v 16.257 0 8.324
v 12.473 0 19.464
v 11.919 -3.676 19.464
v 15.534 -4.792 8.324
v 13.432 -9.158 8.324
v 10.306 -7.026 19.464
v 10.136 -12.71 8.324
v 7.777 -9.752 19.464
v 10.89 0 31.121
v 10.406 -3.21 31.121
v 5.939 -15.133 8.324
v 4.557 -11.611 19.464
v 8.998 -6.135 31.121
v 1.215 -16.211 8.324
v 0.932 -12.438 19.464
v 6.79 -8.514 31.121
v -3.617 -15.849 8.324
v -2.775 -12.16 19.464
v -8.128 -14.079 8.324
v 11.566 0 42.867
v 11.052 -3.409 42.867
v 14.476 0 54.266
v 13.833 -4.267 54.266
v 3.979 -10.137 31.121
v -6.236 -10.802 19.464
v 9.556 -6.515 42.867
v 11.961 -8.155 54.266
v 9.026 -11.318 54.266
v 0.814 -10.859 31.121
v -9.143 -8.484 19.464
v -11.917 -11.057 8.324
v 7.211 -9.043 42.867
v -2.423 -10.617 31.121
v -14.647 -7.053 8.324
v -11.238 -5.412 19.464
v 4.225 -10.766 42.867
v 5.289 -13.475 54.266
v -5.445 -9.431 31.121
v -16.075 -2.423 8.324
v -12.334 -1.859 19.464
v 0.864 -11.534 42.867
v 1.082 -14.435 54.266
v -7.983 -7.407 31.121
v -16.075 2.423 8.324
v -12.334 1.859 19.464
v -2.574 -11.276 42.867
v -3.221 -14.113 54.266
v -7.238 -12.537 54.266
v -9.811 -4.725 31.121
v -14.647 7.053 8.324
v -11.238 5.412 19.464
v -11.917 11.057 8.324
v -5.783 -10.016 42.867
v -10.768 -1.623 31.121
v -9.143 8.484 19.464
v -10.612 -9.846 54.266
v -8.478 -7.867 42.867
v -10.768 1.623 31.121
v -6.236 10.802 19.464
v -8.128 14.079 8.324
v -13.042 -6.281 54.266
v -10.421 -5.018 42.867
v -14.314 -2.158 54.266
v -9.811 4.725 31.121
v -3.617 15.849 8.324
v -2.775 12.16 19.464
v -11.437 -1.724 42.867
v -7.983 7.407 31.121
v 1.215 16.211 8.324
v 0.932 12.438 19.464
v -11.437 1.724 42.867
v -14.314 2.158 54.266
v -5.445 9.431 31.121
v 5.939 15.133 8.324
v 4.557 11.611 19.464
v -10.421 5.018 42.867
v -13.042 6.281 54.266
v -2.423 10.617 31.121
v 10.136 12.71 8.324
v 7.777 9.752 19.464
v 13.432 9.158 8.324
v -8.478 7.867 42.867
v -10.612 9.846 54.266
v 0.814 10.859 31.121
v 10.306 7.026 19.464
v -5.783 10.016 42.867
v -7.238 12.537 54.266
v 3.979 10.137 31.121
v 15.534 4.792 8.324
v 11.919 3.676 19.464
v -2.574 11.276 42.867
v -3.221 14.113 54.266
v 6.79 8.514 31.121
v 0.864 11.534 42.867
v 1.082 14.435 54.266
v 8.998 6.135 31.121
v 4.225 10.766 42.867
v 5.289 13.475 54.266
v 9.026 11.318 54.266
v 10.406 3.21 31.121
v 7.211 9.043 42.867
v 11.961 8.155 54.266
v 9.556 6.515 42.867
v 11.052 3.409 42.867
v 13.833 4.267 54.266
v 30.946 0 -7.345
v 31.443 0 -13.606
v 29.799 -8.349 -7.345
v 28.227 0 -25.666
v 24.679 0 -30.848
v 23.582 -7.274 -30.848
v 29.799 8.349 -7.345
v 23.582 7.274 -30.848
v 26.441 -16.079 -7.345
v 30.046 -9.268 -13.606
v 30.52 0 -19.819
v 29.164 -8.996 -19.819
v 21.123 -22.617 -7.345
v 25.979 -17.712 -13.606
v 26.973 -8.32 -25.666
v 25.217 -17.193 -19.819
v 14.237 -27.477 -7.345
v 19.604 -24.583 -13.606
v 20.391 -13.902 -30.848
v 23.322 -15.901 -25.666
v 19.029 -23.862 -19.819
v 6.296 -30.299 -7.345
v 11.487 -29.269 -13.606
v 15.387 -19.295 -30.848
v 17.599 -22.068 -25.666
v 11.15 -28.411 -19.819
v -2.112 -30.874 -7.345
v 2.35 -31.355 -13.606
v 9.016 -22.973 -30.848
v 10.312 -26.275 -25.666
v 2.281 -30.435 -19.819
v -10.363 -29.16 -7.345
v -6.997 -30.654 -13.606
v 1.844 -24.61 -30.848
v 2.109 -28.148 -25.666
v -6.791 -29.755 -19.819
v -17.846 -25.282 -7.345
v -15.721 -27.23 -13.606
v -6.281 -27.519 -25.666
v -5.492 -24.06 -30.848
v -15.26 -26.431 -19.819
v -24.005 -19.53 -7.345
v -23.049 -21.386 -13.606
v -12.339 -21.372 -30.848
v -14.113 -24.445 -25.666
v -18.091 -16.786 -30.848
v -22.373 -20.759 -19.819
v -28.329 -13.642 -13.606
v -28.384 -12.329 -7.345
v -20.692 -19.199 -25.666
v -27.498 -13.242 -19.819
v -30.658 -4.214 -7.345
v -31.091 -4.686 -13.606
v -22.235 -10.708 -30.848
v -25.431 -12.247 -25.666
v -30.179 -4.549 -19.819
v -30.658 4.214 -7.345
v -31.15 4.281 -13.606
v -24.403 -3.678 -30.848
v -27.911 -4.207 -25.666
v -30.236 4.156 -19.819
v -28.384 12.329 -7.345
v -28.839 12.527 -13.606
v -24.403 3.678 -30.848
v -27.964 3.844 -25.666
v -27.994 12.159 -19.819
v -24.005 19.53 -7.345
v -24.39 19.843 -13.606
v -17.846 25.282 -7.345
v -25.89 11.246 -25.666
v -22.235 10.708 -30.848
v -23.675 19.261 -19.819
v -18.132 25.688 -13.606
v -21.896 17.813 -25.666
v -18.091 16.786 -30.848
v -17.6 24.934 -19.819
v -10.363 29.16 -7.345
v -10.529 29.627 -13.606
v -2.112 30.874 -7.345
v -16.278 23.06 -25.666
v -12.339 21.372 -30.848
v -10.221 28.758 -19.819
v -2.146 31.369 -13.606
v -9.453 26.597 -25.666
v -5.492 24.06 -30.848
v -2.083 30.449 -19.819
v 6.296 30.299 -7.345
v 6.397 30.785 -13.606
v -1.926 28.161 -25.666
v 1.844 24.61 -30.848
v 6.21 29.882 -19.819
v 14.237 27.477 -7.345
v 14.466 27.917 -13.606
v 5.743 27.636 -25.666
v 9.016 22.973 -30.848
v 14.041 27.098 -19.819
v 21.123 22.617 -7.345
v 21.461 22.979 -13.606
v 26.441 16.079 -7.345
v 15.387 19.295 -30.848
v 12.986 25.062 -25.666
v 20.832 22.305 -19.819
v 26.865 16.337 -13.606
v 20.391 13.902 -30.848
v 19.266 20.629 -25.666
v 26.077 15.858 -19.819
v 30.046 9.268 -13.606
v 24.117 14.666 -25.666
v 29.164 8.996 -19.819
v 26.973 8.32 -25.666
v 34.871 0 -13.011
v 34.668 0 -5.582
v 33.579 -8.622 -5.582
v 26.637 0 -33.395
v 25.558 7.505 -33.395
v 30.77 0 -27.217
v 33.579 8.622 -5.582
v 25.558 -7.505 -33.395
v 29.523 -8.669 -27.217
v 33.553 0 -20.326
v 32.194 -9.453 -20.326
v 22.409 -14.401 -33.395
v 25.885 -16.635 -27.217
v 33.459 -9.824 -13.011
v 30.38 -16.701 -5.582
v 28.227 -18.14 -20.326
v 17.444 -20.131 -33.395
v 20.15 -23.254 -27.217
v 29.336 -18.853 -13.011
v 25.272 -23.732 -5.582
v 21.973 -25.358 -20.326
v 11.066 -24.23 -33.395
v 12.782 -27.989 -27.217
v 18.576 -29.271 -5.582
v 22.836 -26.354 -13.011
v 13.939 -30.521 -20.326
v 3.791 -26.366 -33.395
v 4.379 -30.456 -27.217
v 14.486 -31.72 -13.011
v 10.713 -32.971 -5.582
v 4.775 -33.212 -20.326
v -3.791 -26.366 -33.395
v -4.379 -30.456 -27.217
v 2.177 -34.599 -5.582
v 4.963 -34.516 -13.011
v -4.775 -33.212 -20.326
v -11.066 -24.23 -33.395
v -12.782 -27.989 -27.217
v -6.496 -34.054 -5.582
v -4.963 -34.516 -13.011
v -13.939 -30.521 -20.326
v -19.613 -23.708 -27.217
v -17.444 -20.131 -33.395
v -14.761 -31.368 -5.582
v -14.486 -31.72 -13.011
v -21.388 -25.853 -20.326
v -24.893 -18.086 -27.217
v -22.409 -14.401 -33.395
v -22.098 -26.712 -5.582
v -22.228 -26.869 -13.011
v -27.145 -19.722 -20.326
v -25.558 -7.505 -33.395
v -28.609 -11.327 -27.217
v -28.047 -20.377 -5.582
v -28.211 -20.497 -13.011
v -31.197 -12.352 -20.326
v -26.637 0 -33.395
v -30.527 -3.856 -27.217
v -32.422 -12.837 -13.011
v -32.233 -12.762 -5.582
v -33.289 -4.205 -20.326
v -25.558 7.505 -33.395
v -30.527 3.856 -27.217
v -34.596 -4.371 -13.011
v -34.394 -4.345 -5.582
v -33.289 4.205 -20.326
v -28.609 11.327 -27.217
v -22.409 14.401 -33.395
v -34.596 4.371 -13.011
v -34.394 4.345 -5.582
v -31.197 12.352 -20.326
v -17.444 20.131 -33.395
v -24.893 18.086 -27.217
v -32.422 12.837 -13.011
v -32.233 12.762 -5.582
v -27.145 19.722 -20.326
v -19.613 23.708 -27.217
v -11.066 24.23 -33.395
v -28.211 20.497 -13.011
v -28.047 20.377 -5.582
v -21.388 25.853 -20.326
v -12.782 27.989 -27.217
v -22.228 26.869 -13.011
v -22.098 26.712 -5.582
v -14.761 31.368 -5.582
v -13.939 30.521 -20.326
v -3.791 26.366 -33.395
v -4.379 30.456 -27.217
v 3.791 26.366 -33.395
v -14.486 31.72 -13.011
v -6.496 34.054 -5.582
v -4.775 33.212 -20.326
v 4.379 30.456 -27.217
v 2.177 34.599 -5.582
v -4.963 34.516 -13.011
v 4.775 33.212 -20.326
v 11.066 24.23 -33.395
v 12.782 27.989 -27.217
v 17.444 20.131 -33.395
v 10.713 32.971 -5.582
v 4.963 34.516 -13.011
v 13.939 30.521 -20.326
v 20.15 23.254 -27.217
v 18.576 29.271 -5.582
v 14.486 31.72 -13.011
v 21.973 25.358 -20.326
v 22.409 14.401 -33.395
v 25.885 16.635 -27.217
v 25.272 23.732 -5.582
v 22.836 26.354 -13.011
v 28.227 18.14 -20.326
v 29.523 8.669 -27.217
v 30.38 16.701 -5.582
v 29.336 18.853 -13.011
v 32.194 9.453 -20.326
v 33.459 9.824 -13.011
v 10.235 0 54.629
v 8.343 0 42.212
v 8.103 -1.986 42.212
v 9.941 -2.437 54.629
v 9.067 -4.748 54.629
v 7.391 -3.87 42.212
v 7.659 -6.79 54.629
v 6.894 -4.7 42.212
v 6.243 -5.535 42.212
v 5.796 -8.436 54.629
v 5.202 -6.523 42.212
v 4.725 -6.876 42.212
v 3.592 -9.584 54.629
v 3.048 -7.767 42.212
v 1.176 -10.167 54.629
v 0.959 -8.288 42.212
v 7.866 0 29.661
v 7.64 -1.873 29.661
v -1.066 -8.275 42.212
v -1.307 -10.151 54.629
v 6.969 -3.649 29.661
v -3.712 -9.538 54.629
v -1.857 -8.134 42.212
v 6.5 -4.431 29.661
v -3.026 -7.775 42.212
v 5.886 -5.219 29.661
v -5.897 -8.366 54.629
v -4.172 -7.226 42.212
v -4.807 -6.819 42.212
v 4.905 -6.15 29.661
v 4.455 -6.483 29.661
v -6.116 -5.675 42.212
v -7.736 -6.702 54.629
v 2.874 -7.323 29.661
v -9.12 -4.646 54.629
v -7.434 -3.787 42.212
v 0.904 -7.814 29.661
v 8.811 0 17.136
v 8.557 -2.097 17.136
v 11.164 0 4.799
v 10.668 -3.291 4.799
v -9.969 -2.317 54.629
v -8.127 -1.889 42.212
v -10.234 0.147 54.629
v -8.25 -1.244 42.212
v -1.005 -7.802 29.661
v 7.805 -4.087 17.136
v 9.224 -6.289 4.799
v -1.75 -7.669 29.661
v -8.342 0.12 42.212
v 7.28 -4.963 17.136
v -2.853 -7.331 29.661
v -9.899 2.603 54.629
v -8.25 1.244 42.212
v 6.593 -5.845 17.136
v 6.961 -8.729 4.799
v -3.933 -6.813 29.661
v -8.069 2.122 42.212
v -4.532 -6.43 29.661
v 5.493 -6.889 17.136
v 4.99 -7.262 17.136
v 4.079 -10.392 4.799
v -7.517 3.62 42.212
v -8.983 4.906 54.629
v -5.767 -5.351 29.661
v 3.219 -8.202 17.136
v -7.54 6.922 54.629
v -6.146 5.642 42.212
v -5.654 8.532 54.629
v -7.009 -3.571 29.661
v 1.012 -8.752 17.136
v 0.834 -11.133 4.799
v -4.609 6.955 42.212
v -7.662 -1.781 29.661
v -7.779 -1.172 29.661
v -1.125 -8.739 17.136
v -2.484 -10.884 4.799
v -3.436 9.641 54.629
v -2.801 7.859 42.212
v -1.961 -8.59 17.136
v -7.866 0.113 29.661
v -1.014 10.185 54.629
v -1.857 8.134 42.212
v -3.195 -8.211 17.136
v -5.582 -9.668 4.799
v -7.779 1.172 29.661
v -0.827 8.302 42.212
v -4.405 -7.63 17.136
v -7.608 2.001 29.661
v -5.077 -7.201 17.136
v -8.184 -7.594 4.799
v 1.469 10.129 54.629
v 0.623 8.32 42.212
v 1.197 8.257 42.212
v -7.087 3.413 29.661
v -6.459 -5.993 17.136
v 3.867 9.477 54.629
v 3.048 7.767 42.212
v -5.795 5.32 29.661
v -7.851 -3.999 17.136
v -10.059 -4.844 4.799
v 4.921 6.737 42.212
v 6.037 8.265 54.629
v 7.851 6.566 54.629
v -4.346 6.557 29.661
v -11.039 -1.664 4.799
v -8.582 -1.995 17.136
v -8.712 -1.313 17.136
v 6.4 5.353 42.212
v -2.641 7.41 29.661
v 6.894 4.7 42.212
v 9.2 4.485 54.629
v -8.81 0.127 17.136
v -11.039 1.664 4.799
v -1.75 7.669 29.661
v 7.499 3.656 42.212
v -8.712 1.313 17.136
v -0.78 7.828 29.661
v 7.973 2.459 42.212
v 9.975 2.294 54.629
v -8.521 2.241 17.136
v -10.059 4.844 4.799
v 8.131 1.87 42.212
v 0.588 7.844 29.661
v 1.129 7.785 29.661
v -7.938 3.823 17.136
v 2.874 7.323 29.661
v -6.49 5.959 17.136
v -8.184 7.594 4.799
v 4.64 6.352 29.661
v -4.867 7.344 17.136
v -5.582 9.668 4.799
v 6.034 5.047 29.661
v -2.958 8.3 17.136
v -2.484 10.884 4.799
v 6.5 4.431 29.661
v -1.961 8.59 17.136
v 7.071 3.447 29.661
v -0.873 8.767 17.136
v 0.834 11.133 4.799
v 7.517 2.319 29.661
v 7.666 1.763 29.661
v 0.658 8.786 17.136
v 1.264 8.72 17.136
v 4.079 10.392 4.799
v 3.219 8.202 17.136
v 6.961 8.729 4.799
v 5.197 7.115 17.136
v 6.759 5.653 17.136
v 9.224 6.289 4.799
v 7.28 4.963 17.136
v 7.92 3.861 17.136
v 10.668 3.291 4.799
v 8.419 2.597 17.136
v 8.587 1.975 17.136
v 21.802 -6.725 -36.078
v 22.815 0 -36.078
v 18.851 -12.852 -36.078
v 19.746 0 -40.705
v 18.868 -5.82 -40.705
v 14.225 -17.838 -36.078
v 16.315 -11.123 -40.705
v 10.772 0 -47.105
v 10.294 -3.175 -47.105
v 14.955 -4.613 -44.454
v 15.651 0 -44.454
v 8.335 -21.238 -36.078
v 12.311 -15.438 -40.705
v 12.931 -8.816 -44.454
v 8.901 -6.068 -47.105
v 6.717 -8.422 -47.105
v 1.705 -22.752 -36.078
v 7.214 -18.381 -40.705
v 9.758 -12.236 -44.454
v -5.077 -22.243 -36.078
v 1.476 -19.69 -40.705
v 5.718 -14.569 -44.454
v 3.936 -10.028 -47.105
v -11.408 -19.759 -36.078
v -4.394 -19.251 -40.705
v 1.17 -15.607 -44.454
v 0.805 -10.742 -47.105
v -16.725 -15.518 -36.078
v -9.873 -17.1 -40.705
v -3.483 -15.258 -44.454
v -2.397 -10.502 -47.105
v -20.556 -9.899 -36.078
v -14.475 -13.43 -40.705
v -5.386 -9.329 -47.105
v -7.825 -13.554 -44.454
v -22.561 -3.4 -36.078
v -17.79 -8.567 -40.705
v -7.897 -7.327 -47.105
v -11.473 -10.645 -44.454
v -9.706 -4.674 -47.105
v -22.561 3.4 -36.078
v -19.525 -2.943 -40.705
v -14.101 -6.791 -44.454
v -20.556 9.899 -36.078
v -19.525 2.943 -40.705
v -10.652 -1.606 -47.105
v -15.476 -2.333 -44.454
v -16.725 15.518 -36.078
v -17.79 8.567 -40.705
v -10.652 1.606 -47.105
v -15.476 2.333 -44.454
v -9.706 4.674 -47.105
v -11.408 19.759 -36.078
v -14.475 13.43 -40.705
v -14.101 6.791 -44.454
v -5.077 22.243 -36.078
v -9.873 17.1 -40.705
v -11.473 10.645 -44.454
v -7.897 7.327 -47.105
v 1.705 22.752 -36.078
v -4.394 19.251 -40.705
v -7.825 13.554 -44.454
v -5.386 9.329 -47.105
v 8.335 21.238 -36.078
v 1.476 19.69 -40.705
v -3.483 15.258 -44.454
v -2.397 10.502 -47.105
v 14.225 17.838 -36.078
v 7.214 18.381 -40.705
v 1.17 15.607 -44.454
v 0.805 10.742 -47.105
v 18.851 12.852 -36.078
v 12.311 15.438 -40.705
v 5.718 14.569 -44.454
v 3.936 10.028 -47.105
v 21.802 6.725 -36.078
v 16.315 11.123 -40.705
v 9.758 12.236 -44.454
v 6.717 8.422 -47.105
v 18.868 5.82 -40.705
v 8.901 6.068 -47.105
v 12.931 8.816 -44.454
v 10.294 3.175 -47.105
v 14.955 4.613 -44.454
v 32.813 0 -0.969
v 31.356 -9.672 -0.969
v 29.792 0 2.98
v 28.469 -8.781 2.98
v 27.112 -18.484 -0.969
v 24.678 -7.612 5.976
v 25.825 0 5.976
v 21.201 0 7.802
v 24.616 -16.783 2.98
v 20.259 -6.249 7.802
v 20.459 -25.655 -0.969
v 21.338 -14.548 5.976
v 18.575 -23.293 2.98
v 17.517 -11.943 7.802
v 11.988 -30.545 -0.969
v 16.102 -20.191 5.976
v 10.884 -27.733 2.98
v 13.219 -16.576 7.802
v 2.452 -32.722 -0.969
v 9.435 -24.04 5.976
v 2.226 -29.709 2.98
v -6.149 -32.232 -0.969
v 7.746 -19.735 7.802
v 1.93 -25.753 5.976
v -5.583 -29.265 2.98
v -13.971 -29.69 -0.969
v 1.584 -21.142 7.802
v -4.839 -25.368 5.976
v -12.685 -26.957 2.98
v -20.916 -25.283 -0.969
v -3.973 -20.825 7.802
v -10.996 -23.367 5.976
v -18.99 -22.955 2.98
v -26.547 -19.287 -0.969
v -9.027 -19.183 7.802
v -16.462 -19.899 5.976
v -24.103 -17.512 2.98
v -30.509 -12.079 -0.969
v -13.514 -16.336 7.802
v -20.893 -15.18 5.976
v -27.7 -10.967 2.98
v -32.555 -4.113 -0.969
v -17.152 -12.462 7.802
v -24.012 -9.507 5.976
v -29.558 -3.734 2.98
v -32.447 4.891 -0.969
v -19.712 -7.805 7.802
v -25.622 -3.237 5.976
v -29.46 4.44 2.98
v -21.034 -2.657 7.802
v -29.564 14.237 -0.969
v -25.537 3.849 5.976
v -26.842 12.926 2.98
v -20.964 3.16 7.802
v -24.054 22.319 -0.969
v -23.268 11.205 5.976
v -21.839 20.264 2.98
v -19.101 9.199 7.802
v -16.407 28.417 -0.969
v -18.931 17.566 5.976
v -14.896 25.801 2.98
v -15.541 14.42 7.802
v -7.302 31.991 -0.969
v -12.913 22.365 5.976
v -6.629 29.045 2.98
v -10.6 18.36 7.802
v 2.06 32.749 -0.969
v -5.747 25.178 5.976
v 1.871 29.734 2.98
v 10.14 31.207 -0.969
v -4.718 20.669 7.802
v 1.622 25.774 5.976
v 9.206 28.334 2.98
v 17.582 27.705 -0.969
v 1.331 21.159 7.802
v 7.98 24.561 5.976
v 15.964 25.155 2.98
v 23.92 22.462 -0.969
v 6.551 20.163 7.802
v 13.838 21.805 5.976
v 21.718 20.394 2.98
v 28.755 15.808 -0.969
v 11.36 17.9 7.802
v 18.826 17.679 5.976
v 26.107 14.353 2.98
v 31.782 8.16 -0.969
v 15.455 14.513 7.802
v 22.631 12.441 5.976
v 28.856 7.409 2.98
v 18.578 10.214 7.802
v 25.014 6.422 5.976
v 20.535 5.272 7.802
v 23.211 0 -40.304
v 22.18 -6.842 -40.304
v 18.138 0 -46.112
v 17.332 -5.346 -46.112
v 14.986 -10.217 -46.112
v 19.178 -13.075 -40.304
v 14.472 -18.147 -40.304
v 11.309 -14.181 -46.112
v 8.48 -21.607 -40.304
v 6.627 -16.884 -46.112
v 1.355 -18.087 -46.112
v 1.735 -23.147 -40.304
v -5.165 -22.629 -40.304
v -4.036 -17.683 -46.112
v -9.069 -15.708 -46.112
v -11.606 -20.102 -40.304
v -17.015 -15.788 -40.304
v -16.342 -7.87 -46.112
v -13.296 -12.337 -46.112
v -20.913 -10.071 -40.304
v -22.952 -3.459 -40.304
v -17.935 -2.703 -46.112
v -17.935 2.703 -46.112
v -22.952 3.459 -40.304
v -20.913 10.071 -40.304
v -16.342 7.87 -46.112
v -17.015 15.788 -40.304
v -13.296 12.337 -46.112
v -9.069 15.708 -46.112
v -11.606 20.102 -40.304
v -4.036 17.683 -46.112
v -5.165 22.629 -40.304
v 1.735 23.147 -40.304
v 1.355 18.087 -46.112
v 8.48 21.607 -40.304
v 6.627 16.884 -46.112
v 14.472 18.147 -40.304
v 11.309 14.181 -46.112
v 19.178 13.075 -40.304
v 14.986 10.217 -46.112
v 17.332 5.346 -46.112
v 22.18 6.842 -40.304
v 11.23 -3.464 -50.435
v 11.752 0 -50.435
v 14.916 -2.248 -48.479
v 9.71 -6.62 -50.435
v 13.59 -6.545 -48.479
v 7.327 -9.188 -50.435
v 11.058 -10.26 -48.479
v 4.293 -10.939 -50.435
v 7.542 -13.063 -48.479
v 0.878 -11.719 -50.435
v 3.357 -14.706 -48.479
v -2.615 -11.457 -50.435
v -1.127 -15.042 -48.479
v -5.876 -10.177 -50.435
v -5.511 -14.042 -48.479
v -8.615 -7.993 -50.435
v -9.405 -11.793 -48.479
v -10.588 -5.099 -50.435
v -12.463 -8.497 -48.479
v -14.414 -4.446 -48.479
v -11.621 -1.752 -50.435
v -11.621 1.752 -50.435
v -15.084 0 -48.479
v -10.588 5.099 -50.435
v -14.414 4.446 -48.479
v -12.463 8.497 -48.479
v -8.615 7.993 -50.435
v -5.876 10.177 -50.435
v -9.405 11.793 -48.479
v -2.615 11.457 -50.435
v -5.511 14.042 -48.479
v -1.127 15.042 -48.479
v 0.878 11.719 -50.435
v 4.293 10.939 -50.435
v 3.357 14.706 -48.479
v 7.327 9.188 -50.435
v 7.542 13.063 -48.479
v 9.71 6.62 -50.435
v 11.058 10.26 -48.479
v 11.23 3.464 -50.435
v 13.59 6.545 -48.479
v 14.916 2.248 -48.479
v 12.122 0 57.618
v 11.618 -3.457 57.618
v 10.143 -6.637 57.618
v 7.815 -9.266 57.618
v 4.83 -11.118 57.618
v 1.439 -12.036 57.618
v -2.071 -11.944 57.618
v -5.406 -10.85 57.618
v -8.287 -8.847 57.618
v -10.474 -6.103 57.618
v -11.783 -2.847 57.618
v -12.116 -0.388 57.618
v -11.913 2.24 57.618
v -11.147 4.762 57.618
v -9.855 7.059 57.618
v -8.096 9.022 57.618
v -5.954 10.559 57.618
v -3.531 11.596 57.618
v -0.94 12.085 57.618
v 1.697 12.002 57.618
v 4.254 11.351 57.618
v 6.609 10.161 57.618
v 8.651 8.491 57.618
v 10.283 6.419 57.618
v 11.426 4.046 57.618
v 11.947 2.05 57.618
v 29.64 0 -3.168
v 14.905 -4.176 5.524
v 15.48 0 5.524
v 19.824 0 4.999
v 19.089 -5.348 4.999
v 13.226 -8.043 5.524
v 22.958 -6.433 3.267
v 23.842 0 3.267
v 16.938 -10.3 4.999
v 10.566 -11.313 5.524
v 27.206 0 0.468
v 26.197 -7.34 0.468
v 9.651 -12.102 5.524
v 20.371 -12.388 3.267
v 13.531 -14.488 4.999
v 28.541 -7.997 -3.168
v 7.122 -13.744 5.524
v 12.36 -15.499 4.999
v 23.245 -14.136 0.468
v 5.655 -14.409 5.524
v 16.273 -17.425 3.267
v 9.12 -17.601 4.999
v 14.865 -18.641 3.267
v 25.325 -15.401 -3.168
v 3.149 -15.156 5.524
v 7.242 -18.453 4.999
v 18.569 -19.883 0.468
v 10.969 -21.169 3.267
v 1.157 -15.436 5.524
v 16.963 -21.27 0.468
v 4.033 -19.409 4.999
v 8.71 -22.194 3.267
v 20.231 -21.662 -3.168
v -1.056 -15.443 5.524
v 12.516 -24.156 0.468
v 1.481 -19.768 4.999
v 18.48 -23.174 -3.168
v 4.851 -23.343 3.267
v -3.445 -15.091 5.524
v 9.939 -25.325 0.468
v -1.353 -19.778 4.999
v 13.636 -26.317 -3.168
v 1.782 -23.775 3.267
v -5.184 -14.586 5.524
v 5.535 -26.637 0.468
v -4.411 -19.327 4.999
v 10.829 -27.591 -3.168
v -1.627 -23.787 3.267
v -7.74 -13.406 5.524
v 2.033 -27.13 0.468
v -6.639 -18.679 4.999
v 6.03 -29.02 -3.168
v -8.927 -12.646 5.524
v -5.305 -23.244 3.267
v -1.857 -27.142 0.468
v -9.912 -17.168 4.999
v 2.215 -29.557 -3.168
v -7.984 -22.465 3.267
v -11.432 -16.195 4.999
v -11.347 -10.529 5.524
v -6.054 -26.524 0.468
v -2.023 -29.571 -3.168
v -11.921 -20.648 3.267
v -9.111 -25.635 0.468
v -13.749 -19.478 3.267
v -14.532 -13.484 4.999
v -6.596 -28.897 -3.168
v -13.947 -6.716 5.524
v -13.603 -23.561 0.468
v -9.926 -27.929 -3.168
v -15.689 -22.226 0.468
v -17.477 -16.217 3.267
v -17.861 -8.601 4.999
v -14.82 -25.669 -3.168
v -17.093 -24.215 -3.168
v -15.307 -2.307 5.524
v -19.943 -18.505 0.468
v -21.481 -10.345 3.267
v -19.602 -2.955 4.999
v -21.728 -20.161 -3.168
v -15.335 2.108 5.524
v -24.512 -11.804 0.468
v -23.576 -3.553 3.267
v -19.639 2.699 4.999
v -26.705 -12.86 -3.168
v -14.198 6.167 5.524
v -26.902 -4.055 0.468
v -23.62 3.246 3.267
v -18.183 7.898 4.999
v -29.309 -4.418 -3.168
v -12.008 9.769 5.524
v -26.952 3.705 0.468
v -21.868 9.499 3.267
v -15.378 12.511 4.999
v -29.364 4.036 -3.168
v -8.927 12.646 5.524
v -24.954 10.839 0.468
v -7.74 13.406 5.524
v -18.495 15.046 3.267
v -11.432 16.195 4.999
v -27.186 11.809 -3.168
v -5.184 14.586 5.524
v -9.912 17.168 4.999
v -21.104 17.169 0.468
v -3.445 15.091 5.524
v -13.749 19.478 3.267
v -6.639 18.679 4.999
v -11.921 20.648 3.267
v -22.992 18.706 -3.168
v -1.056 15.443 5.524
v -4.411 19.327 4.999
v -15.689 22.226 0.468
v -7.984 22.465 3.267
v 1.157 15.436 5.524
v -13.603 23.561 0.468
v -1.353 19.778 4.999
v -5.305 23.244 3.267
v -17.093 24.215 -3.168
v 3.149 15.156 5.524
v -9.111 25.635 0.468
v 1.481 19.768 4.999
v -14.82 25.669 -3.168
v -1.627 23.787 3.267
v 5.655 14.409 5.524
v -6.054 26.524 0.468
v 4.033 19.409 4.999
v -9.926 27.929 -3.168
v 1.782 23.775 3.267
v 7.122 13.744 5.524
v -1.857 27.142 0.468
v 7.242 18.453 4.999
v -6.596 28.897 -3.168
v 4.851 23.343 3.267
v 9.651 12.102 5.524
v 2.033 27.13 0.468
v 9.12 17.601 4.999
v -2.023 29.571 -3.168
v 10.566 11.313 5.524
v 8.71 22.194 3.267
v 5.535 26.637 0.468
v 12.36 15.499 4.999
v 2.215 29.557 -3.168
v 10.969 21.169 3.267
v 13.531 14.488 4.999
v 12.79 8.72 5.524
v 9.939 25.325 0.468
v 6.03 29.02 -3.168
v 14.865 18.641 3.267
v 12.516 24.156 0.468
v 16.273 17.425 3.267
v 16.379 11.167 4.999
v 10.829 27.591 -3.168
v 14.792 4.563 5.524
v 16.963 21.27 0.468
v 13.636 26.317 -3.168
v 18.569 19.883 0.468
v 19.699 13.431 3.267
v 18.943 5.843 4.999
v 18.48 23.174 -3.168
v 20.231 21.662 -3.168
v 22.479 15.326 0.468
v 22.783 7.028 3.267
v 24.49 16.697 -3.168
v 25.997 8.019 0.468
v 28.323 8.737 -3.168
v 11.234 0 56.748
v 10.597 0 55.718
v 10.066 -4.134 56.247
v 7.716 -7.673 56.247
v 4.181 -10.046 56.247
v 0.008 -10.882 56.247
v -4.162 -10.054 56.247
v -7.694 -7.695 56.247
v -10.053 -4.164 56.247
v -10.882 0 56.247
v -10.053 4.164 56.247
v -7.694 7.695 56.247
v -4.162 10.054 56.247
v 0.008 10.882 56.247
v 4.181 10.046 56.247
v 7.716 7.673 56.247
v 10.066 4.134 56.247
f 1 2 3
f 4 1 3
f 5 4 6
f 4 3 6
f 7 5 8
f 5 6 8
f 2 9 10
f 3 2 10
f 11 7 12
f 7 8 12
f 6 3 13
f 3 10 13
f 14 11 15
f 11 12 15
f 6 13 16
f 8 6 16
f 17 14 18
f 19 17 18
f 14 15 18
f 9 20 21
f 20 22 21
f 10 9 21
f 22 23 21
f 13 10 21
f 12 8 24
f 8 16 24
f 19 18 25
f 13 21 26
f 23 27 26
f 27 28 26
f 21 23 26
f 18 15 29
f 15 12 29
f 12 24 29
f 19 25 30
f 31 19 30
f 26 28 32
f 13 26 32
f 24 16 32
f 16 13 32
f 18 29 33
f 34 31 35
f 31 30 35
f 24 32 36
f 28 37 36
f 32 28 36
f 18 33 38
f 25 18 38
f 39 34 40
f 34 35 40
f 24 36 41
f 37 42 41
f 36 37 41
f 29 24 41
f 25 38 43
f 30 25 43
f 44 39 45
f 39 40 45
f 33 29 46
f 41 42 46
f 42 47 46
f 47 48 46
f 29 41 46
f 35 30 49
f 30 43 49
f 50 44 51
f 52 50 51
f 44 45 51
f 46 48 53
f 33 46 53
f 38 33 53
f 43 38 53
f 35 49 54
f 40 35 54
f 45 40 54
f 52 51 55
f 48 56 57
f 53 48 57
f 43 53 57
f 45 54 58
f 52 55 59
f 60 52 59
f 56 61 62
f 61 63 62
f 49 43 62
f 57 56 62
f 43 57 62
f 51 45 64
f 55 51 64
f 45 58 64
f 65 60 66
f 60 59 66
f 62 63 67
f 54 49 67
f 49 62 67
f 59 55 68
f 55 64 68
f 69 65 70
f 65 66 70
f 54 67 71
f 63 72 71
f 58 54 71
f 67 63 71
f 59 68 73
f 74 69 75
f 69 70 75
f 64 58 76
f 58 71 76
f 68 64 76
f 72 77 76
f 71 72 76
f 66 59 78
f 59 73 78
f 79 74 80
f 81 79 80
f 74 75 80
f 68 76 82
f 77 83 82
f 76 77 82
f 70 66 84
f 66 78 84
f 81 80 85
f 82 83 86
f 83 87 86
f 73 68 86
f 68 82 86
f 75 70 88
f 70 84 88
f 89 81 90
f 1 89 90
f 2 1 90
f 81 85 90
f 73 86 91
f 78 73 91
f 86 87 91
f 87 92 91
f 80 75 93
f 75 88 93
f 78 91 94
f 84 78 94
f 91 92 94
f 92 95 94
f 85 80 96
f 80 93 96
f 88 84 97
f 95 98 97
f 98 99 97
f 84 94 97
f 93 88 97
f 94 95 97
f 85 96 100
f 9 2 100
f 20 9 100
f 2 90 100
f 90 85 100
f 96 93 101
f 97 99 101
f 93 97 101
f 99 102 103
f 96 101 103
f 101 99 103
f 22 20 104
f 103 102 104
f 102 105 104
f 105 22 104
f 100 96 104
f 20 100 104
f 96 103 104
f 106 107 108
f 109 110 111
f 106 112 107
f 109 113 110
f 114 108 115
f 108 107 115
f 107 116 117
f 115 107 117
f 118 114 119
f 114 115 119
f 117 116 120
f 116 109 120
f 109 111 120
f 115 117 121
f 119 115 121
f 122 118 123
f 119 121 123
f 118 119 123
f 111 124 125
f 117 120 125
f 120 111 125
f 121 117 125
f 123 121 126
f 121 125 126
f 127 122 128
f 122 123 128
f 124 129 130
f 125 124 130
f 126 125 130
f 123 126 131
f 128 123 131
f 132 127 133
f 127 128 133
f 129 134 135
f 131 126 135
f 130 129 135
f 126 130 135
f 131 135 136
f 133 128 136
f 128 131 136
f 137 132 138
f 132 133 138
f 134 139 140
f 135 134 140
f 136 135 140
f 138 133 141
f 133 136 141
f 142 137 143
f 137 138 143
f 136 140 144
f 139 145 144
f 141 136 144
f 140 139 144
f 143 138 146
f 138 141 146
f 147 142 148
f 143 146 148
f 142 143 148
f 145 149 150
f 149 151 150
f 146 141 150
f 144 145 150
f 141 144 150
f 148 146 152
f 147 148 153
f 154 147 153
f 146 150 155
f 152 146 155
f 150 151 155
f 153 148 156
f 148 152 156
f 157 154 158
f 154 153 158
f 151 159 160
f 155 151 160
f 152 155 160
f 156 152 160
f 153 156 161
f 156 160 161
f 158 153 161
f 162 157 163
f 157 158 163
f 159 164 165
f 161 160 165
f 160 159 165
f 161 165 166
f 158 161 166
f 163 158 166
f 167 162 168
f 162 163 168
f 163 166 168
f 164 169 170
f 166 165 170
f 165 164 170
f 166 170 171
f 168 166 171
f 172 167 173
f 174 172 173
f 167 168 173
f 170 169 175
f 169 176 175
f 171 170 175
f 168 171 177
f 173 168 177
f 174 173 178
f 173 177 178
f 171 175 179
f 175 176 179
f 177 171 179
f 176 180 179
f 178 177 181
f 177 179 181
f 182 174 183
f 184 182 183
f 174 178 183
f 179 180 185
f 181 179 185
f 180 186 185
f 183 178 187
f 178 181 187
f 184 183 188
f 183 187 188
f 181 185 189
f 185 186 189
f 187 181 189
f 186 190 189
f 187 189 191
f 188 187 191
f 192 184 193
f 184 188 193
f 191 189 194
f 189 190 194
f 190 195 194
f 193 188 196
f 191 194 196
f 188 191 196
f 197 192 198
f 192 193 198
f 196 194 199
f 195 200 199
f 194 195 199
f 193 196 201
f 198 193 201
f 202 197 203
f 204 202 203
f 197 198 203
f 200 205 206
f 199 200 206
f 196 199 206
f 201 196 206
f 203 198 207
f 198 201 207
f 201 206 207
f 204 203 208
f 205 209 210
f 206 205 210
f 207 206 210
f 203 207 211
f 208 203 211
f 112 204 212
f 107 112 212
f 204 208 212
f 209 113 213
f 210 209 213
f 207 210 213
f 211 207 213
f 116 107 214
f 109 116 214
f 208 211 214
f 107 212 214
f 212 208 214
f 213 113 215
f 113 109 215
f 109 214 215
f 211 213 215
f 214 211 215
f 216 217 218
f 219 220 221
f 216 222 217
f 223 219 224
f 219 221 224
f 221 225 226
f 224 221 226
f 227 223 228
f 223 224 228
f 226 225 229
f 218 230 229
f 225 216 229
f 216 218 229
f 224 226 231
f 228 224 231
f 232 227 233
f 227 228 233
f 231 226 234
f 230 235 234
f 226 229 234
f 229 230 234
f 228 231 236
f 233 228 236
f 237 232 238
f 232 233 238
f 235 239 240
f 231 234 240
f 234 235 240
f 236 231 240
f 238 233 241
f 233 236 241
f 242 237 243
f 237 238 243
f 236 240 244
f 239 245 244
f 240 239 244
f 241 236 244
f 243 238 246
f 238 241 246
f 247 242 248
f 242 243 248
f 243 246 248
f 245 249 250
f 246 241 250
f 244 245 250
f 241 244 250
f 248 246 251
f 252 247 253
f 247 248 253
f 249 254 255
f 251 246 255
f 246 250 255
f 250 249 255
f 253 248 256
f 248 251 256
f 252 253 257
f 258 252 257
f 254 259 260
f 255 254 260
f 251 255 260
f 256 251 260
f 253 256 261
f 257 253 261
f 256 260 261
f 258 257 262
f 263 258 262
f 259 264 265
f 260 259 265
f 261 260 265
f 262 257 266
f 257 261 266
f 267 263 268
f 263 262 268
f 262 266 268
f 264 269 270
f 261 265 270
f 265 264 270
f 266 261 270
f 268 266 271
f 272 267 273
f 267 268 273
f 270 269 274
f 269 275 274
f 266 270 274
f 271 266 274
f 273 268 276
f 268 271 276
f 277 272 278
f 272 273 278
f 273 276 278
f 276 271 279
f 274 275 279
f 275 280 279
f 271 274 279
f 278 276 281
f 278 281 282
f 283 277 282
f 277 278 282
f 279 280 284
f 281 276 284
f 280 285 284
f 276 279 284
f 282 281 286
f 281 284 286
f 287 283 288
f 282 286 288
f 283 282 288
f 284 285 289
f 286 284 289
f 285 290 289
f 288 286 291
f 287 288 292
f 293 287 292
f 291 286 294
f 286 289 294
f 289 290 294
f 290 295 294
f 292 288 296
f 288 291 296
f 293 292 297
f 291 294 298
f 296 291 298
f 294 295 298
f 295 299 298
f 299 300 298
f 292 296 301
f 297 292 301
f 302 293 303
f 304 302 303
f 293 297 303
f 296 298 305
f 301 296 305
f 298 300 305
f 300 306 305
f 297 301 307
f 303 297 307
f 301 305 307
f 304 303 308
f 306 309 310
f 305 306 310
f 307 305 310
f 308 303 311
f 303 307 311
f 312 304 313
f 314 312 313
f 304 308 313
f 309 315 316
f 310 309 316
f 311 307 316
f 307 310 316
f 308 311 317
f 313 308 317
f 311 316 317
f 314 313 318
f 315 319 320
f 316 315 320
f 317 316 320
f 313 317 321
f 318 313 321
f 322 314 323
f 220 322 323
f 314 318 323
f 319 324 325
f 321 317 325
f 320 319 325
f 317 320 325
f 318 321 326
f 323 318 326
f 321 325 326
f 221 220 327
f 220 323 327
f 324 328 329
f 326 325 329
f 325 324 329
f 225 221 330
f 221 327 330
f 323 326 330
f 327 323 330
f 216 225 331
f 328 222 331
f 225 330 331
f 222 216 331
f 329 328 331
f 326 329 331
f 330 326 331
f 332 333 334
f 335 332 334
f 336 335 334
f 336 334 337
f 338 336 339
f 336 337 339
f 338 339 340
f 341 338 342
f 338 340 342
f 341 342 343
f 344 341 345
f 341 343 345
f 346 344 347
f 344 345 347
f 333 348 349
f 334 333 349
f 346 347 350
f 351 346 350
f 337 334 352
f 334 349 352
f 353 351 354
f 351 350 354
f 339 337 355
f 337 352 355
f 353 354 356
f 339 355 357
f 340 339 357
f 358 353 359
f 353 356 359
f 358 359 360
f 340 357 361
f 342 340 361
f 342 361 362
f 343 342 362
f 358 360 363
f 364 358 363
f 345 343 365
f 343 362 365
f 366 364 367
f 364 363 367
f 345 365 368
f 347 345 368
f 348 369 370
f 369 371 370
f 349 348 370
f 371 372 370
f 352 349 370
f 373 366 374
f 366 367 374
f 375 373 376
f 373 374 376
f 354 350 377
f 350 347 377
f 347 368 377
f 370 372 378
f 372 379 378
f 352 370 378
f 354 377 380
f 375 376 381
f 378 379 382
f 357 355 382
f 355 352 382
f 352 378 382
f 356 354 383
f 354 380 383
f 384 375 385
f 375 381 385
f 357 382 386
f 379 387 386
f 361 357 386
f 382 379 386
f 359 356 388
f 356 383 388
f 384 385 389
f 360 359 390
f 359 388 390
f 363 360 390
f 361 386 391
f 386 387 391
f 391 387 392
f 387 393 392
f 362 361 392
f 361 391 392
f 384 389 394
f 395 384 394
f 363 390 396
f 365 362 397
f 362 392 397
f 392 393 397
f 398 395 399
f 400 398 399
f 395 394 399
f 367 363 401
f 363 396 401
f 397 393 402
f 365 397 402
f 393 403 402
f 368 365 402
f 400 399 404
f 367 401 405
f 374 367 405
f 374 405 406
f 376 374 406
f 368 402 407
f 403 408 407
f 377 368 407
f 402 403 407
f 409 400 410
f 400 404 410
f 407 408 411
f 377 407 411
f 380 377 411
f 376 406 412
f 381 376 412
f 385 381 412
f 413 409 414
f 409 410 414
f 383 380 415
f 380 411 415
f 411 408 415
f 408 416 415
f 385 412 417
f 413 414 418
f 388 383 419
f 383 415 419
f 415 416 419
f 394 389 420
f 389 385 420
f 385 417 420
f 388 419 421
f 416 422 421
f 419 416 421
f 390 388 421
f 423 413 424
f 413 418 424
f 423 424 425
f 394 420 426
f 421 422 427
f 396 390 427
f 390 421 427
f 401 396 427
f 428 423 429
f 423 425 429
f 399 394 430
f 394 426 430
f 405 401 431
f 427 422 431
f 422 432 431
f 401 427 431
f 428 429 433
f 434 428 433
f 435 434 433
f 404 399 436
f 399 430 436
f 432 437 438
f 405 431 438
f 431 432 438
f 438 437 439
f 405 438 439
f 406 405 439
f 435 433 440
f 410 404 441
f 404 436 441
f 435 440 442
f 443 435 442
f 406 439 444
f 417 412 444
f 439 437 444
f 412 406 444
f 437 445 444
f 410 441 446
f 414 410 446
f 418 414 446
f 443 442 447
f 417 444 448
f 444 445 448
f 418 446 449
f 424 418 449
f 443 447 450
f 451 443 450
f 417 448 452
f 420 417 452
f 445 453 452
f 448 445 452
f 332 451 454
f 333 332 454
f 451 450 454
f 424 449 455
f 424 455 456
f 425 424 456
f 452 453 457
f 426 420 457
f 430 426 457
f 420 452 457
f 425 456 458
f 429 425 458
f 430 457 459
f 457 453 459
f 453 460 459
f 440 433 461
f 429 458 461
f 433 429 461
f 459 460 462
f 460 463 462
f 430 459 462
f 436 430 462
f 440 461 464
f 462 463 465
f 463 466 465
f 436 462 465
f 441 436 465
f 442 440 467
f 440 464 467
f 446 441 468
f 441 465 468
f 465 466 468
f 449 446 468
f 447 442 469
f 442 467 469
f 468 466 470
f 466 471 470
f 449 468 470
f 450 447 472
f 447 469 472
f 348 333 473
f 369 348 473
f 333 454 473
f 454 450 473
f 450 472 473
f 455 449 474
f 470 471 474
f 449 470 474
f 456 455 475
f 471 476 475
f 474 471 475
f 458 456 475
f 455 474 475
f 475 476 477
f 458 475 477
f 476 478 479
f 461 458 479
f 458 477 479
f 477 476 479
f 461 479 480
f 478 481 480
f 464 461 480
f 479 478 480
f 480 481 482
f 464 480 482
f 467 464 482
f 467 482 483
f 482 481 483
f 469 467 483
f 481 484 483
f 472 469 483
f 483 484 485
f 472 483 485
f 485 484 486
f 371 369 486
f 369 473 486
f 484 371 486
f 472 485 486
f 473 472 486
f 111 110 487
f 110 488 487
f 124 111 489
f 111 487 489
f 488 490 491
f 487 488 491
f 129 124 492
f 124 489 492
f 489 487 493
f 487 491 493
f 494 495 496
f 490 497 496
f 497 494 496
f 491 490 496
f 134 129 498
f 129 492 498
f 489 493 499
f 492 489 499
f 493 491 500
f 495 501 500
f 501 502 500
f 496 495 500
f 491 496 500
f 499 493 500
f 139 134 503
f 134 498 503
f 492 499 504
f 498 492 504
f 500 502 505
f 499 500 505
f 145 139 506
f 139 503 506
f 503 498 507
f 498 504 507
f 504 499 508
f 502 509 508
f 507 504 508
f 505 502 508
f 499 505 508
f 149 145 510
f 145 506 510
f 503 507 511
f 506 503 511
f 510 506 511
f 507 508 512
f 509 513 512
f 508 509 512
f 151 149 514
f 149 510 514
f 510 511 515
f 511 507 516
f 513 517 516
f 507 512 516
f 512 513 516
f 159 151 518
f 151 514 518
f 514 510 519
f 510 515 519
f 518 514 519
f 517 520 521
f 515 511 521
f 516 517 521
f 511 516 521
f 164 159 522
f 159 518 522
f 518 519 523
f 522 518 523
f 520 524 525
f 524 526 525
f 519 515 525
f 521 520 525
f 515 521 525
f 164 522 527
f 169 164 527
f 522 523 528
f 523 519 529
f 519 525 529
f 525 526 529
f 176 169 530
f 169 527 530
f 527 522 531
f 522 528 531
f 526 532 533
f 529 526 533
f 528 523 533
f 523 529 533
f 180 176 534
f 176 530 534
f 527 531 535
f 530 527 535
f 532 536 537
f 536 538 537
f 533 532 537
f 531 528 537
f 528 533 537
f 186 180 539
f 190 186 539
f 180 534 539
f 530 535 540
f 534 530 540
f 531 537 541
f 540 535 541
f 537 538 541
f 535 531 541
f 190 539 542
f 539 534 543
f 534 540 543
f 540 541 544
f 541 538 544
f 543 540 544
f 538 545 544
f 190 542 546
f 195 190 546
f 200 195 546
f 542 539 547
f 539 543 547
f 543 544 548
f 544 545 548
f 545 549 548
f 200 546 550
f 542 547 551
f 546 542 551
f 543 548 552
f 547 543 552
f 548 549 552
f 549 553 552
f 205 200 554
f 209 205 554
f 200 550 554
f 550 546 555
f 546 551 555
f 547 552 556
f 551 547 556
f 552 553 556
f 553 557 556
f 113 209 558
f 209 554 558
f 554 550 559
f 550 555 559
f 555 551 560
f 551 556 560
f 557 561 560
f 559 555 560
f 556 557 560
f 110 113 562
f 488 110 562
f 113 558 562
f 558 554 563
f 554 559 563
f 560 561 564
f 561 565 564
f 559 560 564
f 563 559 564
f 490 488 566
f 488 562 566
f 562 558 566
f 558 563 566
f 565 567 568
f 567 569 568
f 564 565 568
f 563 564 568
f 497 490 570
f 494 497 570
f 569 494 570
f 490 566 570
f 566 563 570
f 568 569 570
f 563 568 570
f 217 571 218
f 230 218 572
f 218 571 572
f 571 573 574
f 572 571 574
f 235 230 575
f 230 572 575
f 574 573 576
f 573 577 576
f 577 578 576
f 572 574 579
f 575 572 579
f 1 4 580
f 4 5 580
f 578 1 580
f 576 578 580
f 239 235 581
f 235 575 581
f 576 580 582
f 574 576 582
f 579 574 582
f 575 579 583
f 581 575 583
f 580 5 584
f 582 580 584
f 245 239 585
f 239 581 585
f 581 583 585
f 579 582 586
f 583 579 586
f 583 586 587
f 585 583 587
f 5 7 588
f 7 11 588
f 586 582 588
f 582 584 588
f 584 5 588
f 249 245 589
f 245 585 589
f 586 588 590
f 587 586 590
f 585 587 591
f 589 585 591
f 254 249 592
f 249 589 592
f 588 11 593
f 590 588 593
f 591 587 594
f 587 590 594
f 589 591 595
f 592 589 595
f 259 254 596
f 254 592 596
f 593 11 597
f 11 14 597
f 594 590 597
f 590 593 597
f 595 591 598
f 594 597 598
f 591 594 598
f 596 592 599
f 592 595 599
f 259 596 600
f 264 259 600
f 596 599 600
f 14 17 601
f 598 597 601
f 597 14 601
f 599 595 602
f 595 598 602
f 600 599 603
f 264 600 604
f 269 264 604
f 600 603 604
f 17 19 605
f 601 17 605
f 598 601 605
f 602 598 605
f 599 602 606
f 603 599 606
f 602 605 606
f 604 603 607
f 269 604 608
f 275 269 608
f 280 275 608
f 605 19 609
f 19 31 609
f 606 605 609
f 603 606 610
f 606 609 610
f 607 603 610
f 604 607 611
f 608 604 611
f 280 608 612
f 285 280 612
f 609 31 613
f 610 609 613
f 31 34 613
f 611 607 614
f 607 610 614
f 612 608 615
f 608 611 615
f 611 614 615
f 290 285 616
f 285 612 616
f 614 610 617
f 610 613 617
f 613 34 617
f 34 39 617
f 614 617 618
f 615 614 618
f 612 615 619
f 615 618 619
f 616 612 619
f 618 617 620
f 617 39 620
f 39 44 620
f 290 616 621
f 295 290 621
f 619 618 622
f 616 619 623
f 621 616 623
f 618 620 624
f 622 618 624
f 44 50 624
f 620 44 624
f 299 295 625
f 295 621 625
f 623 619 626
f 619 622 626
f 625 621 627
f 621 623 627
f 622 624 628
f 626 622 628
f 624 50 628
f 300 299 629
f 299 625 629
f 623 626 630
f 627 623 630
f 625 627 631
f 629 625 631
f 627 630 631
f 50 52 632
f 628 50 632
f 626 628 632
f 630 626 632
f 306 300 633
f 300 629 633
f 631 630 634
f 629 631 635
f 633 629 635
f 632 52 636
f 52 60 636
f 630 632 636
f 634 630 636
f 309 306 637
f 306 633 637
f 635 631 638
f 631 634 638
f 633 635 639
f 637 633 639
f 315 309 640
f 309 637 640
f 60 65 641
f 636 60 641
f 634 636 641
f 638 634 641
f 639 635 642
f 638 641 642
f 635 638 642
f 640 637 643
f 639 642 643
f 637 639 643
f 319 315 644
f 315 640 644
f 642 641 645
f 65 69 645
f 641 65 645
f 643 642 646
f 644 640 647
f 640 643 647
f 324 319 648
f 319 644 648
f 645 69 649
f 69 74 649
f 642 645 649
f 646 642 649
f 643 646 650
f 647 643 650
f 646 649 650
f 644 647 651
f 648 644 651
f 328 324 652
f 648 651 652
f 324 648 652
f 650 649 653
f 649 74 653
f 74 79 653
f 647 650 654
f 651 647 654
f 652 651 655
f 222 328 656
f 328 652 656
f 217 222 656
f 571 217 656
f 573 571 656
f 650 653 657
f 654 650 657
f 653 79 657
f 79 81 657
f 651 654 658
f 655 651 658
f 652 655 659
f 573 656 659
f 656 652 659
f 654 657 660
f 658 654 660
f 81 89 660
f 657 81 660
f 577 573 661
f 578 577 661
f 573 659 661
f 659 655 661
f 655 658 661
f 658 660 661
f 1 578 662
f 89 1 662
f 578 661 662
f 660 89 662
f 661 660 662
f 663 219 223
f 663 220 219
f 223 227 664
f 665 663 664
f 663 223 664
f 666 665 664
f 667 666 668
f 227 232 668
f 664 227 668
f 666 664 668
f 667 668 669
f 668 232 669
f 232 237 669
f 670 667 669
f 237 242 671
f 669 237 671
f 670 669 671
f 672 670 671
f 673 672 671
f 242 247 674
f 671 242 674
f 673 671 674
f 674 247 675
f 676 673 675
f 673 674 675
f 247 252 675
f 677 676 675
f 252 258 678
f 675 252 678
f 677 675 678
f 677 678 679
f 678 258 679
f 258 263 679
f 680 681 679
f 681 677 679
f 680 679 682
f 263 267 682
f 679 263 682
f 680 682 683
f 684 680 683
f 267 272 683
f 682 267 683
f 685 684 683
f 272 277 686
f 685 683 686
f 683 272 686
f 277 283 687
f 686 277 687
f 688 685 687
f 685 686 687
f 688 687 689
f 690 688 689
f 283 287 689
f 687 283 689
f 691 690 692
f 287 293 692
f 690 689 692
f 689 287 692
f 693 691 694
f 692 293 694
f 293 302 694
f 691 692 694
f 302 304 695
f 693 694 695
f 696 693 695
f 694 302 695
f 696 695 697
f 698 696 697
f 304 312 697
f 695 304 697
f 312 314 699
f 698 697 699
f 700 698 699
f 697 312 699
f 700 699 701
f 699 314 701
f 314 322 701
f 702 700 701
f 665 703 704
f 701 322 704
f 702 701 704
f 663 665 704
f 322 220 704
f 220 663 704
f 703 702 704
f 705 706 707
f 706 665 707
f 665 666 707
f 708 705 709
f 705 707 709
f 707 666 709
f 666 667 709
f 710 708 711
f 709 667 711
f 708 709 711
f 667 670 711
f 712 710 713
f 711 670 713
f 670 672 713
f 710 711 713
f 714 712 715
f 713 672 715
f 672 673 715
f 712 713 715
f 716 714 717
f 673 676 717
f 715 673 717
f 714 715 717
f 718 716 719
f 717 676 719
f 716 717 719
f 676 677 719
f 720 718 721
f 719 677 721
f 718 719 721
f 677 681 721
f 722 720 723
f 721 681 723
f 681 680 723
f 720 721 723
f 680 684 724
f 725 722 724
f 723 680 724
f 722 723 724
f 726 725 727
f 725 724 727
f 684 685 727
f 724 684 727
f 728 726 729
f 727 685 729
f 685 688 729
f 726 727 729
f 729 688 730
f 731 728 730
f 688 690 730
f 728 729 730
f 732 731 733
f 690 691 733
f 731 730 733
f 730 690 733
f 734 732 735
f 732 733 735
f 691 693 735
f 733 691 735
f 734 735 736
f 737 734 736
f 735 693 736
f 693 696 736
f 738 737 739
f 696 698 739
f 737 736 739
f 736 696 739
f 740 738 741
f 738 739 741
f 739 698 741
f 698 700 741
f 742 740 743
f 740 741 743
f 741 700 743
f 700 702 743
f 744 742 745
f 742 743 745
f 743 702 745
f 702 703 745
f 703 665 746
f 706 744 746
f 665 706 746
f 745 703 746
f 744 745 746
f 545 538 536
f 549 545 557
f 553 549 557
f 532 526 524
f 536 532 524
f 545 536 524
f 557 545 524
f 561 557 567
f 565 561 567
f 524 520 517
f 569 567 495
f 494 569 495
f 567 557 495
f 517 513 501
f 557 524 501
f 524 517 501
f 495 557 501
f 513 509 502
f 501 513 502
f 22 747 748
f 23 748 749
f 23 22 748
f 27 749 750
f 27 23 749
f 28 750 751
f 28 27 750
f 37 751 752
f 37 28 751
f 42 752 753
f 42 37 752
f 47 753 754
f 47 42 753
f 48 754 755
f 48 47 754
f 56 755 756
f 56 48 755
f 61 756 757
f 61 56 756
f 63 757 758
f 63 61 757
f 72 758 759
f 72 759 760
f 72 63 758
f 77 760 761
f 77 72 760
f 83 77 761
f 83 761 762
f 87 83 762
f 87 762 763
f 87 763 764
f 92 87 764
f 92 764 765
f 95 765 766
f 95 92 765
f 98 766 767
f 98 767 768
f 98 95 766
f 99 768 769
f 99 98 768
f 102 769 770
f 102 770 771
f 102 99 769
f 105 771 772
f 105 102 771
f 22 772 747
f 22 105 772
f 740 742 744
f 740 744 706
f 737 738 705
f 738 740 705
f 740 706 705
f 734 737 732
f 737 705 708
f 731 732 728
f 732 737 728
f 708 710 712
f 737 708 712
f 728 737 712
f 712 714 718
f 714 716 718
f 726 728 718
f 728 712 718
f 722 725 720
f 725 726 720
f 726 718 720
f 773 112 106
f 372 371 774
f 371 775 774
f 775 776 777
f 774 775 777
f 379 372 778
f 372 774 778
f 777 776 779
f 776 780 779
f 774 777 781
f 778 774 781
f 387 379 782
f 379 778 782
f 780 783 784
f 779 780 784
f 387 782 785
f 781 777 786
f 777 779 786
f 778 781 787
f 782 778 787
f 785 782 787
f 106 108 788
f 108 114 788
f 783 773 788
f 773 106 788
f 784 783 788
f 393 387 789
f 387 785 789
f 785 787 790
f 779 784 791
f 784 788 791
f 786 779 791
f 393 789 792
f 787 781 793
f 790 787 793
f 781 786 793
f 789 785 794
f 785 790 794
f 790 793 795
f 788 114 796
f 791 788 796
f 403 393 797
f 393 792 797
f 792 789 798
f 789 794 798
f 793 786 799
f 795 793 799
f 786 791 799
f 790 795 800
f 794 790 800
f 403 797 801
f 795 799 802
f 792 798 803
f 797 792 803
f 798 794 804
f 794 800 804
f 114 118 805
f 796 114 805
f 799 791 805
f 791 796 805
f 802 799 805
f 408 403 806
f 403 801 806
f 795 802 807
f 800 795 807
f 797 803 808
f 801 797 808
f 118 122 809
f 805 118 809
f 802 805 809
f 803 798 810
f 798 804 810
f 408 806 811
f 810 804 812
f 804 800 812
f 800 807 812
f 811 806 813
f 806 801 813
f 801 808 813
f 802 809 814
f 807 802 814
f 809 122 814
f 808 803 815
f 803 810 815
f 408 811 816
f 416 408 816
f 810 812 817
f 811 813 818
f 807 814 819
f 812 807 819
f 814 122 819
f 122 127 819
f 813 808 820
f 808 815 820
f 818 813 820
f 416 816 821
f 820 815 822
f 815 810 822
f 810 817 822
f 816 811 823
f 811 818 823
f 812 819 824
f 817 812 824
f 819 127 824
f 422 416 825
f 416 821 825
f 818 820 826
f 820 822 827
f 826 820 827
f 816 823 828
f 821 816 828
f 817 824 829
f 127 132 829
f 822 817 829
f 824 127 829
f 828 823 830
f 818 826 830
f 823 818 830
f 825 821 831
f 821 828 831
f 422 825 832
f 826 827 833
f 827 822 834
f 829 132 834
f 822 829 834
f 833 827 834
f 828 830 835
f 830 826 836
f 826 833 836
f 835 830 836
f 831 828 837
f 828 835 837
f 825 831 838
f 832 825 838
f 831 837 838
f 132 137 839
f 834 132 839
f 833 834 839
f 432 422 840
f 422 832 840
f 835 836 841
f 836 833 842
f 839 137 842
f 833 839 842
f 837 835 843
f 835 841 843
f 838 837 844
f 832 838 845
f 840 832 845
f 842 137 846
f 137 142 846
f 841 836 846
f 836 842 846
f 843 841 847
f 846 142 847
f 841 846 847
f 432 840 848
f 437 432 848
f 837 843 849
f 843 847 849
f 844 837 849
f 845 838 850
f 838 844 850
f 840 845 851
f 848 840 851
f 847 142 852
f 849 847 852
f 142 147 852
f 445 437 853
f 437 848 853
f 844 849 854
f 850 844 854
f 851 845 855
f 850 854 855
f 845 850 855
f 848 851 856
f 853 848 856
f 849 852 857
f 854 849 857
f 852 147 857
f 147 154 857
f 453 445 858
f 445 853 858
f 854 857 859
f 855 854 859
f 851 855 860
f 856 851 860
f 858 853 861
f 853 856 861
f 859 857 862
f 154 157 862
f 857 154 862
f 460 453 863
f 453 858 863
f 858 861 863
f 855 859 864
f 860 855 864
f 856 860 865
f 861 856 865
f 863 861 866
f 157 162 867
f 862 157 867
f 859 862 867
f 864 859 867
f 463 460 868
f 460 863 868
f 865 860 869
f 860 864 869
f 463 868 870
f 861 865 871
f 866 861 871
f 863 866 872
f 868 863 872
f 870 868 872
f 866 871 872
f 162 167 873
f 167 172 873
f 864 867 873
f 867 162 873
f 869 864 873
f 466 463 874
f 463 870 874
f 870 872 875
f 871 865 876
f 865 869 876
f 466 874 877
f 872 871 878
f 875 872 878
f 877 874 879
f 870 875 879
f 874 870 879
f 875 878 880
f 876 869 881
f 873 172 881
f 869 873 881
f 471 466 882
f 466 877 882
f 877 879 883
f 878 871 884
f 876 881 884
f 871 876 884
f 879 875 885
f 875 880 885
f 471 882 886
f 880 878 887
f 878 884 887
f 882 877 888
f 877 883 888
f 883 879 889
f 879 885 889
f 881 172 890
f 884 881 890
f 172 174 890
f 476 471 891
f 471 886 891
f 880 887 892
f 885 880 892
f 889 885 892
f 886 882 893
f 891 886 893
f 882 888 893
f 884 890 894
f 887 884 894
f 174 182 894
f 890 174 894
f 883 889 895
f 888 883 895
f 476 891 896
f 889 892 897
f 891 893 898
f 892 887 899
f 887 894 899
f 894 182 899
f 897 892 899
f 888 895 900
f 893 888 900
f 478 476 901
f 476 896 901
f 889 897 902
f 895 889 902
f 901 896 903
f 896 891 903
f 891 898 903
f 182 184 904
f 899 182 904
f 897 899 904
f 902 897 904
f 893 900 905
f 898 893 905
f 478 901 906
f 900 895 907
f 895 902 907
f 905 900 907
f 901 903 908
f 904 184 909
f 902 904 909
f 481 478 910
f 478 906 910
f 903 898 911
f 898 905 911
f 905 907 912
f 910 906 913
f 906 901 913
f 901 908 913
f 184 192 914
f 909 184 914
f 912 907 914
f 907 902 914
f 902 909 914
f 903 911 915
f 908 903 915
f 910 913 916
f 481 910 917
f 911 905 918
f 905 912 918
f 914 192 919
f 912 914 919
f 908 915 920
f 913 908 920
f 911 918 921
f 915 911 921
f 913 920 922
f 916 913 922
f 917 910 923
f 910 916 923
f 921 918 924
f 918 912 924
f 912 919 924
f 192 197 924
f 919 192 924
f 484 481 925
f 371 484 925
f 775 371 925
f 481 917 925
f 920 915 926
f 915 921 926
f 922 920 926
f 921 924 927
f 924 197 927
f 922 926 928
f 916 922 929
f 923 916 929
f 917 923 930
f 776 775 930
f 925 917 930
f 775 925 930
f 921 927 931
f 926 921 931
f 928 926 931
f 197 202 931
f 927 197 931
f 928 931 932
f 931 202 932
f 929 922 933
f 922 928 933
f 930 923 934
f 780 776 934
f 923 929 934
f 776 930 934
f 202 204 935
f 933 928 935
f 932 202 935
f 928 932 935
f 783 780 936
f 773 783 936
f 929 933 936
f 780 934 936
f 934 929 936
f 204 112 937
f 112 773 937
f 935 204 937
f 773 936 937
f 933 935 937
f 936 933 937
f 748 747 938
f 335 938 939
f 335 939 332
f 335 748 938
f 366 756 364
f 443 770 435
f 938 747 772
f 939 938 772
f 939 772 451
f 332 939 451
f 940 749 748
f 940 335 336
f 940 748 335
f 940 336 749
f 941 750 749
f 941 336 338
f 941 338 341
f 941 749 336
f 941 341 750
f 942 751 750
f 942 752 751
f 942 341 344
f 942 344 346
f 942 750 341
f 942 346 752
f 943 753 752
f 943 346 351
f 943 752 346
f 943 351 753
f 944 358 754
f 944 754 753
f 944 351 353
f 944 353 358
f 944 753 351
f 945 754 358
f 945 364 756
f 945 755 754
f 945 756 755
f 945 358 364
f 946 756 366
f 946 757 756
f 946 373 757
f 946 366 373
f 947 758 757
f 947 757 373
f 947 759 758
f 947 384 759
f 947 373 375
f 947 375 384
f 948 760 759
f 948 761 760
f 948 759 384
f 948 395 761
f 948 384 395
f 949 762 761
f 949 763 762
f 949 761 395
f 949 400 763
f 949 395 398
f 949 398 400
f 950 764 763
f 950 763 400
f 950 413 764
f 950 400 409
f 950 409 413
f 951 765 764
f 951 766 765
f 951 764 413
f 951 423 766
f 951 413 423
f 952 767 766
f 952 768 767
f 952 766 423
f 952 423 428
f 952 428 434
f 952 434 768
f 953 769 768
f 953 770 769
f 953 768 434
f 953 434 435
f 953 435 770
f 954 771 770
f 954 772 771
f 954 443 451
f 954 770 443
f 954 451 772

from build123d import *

# Parameters (mm, degrees)
F2_R = 5.08


# Not quite as in the source:
# - a fillet or chamfer that OpenCascade refuses, or shapes differently, is made with other operations: its cross-section is extruded or revolved along the edge and cut away or added


with BuildPart() as f1:
    # F0 (on Front) → F1 (revolve)
    with BuildSketch(Plane.XZ):
        with BuildLine():
            Line((0, -47.1050292253), (0, -50.4347011447))
            Line((0, -50.4347011447), (11.7517746985, -50.4347011447))
            ThreePointArc((11.7517746985, -50.4347011447), (20.8619938289, -43.371268105), (26.6373567283, -33.3946272731))
            ThreePointArc((26.6373567283, -33.3946272731), (33.5533359341, -20.325912086), (34.667737782, -5.5820932612))
            ThreePointArc((34.667737782, -5.5820932612), (27.9104157982, 4.6123678288), (16.2566211075, 8.3241742104))
            ThreePointArc((16.2566211075, 8.3241742104), (10.8439744561, 33.4925586358), (16.2566211075, 58.6609430611))
            Line((16.2566211075, 58.6609430611), (11.164185591, 58.6609430611))
            ThreePointArc((11.164185591, 58.6609430611), (7.8471857088, 31.7297922447), (11.164185591, 4.7986414284))
            ThreePointArc((11.164185591, 4.7986414284), (23.8420983973, 3.2667371045), (30.9463385493, -7.3448591866))
            ThreePointArc((30.9463385493, -7.3448591866), (30.5202544526, -19.8186924416), (24.6787276119, -30.8484081179))
            ThreePointArc((24.6787276119, -30.8484081179), (19.7456058465, -40.7046808706), (10.7724601403, -47.1050292253))
            Line((10.7724601403, -47.1050292253), (0, -47.1050292253))
        make_face()
    revolve(axis=Axis((0, 0, -48.769865185), (0, 0, -1)))

    # F2
    f2_edges = [f1.edges().sort_by_distance(p)[0] for p in [
        (-11.164186, 0, 58.660943),
    ]]
    fillet(f2_edges, radius=F2_R)

    # F3: chamfer of 5.08 on 1 edges, made by hand

    # F3_s1 → F3_t2 (revolve, cut)
    with BuildSketch(Plane.XZ):
        with BuildLine():
            Line((11.2721133728, 58.8272265334), (14.5927501506, 54.0993891808))
            Line((14.5927501506, 54.0993891808), (14.6883227311, 54.0649153956))
            ThreePointArc((14.6883227311, 54.0649153956), (15.3971944751, 56.3912747767), (16.3492386112, 58.6191751549))
            Line((16.3492386112, 58.6191751549), (16.2566211075, 58.7625430611))
            ThreePointArc((16.2566211075, 58.7625430611), (13.7643672402, 58.7625430611), (11.2721133728, 58.9288265334))
            Line((11.2721133728, 58.9288265334), (11.2721133728, 58.8272265334))
        make_face()
    revolve(axis=Axis((0, 0, 58.6609430611), (0, 0, -1)), mode=Mode.SUBTRACT)


solid = f1.part
